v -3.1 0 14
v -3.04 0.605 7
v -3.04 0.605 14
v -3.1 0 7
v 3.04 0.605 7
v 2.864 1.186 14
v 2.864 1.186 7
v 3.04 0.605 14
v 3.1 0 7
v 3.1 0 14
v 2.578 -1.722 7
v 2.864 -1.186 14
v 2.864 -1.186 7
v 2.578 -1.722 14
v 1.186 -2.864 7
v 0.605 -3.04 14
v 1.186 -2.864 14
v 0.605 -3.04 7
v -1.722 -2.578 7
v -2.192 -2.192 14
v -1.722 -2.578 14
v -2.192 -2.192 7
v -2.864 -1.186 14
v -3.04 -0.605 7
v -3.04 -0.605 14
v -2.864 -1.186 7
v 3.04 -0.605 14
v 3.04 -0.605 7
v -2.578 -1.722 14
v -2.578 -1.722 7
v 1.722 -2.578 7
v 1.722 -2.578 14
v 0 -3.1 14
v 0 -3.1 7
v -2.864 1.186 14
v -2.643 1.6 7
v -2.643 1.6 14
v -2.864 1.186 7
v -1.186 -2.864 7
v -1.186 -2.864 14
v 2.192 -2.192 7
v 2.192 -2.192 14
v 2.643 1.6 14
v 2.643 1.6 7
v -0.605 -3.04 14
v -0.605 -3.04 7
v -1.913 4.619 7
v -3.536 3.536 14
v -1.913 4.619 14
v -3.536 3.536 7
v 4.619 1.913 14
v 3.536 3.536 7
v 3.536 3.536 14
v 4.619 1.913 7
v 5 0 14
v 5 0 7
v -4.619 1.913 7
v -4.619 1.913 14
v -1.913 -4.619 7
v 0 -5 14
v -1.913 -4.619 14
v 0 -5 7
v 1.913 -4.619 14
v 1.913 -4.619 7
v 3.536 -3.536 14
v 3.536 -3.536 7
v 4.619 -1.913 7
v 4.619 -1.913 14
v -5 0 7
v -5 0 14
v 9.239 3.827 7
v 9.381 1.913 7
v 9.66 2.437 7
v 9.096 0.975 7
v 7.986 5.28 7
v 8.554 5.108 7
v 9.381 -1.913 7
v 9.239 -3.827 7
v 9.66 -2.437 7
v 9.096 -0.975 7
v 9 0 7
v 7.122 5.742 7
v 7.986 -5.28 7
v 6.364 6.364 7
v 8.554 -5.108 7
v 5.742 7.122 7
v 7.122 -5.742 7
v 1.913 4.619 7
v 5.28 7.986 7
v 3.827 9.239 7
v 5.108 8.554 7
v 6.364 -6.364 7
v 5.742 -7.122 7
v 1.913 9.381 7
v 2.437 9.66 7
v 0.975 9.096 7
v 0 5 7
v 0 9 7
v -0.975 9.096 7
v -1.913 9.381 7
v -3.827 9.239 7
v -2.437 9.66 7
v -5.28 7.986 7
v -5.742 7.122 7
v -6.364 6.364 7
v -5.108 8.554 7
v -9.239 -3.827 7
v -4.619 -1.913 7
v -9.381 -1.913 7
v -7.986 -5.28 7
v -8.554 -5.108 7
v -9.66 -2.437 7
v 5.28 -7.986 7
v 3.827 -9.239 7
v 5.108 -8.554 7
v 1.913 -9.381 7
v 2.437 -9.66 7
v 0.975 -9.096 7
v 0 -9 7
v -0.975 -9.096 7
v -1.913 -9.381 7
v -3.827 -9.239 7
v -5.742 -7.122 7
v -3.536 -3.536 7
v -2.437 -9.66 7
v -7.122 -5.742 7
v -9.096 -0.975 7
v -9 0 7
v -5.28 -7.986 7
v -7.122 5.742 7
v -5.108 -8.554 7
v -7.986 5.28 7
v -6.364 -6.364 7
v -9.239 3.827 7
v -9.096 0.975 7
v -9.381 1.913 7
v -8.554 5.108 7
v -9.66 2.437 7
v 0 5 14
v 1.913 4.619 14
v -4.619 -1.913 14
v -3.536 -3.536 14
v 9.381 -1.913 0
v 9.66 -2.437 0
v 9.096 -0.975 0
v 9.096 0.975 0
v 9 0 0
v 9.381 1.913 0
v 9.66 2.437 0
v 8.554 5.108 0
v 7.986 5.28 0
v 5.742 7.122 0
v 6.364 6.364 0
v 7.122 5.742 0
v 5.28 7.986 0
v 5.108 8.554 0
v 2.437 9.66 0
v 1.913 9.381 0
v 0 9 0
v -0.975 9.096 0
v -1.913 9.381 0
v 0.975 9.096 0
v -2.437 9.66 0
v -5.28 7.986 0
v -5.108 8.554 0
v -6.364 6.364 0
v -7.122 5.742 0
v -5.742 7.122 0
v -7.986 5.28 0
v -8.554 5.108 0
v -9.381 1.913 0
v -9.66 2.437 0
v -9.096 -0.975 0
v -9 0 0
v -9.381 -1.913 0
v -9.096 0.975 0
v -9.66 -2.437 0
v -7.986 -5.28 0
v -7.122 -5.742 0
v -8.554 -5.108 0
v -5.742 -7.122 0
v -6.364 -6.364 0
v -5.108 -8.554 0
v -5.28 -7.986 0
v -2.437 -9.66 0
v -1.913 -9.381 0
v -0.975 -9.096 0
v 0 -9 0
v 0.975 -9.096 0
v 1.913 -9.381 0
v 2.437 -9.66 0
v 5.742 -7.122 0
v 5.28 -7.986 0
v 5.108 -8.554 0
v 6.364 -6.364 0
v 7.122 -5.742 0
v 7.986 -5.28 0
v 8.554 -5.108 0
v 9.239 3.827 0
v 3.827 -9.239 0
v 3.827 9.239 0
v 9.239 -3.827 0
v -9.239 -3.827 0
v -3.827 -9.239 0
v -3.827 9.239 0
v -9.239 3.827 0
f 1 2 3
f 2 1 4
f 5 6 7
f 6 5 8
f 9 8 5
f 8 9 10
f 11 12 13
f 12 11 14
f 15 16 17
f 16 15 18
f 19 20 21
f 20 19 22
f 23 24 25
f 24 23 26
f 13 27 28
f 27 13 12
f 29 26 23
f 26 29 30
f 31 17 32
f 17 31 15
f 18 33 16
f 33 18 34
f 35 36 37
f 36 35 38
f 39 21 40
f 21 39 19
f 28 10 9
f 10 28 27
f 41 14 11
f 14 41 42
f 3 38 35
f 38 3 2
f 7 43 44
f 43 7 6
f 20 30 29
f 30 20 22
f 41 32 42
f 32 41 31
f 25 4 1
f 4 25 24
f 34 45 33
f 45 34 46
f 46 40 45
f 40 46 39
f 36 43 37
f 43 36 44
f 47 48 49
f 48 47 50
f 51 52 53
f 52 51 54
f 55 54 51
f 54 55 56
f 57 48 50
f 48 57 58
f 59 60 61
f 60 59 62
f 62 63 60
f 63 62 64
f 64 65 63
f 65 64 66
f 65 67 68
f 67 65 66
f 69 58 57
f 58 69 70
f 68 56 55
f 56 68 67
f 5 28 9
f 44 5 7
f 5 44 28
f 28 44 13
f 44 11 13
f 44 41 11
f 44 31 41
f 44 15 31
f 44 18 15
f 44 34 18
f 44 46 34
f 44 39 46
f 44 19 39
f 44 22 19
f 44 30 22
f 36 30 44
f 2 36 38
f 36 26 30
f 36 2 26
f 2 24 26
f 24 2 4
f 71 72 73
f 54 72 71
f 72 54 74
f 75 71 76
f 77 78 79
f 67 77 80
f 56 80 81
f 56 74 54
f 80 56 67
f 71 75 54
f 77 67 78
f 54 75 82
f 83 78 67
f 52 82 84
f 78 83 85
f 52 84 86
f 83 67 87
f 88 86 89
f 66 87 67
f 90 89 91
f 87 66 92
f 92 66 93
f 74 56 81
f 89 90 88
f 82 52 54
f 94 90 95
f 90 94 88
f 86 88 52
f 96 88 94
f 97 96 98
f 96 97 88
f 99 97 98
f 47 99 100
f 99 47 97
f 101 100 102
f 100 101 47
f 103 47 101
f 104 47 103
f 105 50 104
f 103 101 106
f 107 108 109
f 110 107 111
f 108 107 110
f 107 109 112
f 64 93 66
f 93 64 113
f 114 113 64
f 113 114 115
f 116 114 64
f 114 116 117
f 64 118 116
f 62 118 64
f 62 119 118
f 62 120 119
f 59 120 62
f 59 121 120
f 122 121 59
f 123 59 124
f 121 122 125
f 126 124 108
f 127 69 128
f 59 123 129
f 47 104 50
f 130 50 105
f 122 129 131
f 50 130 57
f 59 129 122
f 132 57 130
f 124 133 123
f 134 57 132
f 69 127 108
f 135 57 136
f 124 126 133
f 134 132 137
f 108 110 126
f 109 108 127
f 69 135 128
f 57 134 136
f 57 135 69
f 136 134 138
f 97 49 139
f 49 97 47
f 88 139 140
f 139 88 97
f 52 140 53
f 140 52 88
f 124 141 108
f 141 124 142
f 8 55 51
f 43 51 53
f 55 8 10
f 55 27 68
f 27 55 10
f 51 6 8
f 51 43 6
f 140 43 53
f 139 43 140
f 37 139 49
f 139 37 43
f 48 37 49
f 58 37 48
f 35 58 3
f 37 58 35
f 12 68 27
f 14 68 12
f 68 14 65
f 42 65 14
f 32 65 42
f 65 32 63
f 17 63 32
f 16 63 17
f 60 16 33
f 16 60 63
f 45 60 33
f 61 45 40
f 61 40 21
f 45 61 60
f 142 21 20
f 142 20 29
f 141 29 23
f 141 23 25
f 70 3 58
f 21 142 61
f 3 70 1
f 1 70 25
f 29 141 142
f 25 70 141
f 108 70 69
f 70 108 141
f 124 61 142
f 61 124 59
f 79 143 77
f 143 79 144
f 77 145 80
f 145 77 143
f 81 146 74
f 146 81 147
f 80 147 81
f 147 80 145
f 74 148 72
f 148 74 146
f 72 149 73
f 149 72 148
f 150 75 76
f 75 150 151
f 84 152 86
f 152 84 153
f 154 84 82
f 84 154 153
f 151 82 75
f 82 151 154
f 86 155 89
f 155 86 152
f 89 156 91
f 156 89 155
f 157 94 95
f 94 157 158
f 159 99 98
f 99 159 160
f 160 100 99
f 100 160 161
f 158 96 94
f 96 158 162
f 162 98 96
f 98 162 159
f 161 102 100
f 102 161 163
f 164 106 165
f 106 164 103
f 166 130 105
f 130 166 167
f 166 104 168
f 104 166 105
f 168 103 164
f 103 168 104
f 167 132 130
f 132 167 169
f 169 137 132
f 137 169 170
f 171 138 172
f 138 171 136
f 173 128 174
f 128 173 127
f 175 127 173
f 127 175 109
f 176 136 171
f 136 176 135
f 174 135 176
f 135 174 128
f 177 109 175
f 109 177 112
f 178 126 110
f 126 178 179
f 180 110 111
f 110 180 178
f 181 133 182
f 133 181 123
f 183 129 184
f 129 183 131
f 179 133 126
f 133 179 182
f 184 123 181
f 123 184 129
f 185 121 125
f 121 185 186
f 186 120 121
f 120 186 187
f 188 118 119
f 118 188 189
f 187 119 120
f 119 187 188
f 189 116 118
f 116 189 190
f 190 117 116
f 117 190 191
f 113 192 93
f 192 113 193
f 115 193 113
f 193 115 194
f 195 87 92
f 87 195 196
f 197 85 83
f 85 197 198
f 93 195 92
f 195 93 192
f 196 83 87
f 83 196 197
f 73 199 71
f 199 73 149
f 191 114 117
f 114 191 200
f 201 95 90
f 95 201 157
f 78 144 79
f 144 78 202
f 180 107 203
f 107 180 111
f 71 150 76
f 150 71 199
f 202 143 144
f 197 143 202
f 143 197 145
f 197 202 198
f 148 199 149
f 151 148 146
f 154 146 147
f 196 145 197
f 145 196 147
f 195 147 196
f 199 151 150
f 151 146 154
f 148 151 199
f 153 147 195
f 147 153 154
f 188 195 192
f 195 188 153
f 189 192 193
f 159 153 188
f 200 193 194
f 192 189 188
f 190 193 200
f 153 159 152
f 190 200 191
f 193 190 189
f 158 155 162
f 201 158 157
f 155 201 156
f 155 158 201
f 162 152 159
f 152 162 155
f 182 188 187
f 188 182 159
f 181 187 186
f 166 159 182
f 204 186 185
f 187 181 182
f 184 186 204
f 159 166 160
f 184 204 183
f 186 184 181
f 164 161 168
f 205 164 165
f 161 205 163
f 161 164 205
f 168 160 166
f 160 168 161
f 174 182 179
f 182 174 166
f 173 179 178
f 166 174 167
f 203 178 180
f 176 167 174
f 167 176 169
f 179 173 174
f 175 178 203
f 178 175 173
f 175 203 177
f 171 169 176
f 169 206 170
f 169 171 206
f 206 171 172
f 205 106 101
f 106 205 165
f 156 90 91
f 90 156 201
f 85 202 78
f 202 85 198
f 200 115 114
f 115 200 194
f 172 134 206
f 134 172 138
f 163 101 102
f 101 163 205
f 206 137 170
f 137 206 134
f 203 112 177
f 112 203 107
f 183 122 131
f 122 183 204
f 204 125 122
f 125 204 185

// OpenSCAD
attachHeight=7;
handleHeight=7;
totalHeight=2*attachHeight;
pegRadius=3;
printerMargin=0.1;
handleCylinderFn=32;
attachCylinderFn=16;
handleTextures=8;
handleTextureRadius=10;
frequency=360/handleTextures;
handleRadius=5;
handleTextureOffset=14;

translate([0,0,handleHeight]){
    difference(){
        cylinder(h=attachHeight, r=pegRadius+2, $fn=attachCylinderFn);


        translate([0,0,-1]){
            difference(){
                cubeCutoutHeight=10;
                cubeCutoutOffset=pegRadius/2;
                attachHeightWithMargin=attachHeight+4;
                
                cylinder(
                    h=attachHeightWithMargin,
                    r=pegRadius+printerMargin,
                    $fn=32
                );
                
                translate([
                    -cubeCutoutHeight/2,
                    cubeCutoutOffset+printerMargin,
                    0
                ]){
                    
                    cube(size=[
                        cubeCutoutHeight,
                        cubeCutoutOffset,
                        attachHeightWithMargin
                    ]);
                }
            }
        }    
    }
}


difference(){
    cylinder(h=attachHeight, r=handleTextureRadius, $fn=handleCylinderFn);
        
    for(i=[0:frequency:360]){
        rotate(i, [0,0,1]){
            handleHeightWithMargin=handleHeight+4;
            
            translate([handleTextureOffset,0,-1]){
                cylinder(
                    h=handleHeightWithMargin, 
                    r=handleRadius, 
                    $fn=handleCylinderFn
                );
            }
        }
    }
}
    
    
